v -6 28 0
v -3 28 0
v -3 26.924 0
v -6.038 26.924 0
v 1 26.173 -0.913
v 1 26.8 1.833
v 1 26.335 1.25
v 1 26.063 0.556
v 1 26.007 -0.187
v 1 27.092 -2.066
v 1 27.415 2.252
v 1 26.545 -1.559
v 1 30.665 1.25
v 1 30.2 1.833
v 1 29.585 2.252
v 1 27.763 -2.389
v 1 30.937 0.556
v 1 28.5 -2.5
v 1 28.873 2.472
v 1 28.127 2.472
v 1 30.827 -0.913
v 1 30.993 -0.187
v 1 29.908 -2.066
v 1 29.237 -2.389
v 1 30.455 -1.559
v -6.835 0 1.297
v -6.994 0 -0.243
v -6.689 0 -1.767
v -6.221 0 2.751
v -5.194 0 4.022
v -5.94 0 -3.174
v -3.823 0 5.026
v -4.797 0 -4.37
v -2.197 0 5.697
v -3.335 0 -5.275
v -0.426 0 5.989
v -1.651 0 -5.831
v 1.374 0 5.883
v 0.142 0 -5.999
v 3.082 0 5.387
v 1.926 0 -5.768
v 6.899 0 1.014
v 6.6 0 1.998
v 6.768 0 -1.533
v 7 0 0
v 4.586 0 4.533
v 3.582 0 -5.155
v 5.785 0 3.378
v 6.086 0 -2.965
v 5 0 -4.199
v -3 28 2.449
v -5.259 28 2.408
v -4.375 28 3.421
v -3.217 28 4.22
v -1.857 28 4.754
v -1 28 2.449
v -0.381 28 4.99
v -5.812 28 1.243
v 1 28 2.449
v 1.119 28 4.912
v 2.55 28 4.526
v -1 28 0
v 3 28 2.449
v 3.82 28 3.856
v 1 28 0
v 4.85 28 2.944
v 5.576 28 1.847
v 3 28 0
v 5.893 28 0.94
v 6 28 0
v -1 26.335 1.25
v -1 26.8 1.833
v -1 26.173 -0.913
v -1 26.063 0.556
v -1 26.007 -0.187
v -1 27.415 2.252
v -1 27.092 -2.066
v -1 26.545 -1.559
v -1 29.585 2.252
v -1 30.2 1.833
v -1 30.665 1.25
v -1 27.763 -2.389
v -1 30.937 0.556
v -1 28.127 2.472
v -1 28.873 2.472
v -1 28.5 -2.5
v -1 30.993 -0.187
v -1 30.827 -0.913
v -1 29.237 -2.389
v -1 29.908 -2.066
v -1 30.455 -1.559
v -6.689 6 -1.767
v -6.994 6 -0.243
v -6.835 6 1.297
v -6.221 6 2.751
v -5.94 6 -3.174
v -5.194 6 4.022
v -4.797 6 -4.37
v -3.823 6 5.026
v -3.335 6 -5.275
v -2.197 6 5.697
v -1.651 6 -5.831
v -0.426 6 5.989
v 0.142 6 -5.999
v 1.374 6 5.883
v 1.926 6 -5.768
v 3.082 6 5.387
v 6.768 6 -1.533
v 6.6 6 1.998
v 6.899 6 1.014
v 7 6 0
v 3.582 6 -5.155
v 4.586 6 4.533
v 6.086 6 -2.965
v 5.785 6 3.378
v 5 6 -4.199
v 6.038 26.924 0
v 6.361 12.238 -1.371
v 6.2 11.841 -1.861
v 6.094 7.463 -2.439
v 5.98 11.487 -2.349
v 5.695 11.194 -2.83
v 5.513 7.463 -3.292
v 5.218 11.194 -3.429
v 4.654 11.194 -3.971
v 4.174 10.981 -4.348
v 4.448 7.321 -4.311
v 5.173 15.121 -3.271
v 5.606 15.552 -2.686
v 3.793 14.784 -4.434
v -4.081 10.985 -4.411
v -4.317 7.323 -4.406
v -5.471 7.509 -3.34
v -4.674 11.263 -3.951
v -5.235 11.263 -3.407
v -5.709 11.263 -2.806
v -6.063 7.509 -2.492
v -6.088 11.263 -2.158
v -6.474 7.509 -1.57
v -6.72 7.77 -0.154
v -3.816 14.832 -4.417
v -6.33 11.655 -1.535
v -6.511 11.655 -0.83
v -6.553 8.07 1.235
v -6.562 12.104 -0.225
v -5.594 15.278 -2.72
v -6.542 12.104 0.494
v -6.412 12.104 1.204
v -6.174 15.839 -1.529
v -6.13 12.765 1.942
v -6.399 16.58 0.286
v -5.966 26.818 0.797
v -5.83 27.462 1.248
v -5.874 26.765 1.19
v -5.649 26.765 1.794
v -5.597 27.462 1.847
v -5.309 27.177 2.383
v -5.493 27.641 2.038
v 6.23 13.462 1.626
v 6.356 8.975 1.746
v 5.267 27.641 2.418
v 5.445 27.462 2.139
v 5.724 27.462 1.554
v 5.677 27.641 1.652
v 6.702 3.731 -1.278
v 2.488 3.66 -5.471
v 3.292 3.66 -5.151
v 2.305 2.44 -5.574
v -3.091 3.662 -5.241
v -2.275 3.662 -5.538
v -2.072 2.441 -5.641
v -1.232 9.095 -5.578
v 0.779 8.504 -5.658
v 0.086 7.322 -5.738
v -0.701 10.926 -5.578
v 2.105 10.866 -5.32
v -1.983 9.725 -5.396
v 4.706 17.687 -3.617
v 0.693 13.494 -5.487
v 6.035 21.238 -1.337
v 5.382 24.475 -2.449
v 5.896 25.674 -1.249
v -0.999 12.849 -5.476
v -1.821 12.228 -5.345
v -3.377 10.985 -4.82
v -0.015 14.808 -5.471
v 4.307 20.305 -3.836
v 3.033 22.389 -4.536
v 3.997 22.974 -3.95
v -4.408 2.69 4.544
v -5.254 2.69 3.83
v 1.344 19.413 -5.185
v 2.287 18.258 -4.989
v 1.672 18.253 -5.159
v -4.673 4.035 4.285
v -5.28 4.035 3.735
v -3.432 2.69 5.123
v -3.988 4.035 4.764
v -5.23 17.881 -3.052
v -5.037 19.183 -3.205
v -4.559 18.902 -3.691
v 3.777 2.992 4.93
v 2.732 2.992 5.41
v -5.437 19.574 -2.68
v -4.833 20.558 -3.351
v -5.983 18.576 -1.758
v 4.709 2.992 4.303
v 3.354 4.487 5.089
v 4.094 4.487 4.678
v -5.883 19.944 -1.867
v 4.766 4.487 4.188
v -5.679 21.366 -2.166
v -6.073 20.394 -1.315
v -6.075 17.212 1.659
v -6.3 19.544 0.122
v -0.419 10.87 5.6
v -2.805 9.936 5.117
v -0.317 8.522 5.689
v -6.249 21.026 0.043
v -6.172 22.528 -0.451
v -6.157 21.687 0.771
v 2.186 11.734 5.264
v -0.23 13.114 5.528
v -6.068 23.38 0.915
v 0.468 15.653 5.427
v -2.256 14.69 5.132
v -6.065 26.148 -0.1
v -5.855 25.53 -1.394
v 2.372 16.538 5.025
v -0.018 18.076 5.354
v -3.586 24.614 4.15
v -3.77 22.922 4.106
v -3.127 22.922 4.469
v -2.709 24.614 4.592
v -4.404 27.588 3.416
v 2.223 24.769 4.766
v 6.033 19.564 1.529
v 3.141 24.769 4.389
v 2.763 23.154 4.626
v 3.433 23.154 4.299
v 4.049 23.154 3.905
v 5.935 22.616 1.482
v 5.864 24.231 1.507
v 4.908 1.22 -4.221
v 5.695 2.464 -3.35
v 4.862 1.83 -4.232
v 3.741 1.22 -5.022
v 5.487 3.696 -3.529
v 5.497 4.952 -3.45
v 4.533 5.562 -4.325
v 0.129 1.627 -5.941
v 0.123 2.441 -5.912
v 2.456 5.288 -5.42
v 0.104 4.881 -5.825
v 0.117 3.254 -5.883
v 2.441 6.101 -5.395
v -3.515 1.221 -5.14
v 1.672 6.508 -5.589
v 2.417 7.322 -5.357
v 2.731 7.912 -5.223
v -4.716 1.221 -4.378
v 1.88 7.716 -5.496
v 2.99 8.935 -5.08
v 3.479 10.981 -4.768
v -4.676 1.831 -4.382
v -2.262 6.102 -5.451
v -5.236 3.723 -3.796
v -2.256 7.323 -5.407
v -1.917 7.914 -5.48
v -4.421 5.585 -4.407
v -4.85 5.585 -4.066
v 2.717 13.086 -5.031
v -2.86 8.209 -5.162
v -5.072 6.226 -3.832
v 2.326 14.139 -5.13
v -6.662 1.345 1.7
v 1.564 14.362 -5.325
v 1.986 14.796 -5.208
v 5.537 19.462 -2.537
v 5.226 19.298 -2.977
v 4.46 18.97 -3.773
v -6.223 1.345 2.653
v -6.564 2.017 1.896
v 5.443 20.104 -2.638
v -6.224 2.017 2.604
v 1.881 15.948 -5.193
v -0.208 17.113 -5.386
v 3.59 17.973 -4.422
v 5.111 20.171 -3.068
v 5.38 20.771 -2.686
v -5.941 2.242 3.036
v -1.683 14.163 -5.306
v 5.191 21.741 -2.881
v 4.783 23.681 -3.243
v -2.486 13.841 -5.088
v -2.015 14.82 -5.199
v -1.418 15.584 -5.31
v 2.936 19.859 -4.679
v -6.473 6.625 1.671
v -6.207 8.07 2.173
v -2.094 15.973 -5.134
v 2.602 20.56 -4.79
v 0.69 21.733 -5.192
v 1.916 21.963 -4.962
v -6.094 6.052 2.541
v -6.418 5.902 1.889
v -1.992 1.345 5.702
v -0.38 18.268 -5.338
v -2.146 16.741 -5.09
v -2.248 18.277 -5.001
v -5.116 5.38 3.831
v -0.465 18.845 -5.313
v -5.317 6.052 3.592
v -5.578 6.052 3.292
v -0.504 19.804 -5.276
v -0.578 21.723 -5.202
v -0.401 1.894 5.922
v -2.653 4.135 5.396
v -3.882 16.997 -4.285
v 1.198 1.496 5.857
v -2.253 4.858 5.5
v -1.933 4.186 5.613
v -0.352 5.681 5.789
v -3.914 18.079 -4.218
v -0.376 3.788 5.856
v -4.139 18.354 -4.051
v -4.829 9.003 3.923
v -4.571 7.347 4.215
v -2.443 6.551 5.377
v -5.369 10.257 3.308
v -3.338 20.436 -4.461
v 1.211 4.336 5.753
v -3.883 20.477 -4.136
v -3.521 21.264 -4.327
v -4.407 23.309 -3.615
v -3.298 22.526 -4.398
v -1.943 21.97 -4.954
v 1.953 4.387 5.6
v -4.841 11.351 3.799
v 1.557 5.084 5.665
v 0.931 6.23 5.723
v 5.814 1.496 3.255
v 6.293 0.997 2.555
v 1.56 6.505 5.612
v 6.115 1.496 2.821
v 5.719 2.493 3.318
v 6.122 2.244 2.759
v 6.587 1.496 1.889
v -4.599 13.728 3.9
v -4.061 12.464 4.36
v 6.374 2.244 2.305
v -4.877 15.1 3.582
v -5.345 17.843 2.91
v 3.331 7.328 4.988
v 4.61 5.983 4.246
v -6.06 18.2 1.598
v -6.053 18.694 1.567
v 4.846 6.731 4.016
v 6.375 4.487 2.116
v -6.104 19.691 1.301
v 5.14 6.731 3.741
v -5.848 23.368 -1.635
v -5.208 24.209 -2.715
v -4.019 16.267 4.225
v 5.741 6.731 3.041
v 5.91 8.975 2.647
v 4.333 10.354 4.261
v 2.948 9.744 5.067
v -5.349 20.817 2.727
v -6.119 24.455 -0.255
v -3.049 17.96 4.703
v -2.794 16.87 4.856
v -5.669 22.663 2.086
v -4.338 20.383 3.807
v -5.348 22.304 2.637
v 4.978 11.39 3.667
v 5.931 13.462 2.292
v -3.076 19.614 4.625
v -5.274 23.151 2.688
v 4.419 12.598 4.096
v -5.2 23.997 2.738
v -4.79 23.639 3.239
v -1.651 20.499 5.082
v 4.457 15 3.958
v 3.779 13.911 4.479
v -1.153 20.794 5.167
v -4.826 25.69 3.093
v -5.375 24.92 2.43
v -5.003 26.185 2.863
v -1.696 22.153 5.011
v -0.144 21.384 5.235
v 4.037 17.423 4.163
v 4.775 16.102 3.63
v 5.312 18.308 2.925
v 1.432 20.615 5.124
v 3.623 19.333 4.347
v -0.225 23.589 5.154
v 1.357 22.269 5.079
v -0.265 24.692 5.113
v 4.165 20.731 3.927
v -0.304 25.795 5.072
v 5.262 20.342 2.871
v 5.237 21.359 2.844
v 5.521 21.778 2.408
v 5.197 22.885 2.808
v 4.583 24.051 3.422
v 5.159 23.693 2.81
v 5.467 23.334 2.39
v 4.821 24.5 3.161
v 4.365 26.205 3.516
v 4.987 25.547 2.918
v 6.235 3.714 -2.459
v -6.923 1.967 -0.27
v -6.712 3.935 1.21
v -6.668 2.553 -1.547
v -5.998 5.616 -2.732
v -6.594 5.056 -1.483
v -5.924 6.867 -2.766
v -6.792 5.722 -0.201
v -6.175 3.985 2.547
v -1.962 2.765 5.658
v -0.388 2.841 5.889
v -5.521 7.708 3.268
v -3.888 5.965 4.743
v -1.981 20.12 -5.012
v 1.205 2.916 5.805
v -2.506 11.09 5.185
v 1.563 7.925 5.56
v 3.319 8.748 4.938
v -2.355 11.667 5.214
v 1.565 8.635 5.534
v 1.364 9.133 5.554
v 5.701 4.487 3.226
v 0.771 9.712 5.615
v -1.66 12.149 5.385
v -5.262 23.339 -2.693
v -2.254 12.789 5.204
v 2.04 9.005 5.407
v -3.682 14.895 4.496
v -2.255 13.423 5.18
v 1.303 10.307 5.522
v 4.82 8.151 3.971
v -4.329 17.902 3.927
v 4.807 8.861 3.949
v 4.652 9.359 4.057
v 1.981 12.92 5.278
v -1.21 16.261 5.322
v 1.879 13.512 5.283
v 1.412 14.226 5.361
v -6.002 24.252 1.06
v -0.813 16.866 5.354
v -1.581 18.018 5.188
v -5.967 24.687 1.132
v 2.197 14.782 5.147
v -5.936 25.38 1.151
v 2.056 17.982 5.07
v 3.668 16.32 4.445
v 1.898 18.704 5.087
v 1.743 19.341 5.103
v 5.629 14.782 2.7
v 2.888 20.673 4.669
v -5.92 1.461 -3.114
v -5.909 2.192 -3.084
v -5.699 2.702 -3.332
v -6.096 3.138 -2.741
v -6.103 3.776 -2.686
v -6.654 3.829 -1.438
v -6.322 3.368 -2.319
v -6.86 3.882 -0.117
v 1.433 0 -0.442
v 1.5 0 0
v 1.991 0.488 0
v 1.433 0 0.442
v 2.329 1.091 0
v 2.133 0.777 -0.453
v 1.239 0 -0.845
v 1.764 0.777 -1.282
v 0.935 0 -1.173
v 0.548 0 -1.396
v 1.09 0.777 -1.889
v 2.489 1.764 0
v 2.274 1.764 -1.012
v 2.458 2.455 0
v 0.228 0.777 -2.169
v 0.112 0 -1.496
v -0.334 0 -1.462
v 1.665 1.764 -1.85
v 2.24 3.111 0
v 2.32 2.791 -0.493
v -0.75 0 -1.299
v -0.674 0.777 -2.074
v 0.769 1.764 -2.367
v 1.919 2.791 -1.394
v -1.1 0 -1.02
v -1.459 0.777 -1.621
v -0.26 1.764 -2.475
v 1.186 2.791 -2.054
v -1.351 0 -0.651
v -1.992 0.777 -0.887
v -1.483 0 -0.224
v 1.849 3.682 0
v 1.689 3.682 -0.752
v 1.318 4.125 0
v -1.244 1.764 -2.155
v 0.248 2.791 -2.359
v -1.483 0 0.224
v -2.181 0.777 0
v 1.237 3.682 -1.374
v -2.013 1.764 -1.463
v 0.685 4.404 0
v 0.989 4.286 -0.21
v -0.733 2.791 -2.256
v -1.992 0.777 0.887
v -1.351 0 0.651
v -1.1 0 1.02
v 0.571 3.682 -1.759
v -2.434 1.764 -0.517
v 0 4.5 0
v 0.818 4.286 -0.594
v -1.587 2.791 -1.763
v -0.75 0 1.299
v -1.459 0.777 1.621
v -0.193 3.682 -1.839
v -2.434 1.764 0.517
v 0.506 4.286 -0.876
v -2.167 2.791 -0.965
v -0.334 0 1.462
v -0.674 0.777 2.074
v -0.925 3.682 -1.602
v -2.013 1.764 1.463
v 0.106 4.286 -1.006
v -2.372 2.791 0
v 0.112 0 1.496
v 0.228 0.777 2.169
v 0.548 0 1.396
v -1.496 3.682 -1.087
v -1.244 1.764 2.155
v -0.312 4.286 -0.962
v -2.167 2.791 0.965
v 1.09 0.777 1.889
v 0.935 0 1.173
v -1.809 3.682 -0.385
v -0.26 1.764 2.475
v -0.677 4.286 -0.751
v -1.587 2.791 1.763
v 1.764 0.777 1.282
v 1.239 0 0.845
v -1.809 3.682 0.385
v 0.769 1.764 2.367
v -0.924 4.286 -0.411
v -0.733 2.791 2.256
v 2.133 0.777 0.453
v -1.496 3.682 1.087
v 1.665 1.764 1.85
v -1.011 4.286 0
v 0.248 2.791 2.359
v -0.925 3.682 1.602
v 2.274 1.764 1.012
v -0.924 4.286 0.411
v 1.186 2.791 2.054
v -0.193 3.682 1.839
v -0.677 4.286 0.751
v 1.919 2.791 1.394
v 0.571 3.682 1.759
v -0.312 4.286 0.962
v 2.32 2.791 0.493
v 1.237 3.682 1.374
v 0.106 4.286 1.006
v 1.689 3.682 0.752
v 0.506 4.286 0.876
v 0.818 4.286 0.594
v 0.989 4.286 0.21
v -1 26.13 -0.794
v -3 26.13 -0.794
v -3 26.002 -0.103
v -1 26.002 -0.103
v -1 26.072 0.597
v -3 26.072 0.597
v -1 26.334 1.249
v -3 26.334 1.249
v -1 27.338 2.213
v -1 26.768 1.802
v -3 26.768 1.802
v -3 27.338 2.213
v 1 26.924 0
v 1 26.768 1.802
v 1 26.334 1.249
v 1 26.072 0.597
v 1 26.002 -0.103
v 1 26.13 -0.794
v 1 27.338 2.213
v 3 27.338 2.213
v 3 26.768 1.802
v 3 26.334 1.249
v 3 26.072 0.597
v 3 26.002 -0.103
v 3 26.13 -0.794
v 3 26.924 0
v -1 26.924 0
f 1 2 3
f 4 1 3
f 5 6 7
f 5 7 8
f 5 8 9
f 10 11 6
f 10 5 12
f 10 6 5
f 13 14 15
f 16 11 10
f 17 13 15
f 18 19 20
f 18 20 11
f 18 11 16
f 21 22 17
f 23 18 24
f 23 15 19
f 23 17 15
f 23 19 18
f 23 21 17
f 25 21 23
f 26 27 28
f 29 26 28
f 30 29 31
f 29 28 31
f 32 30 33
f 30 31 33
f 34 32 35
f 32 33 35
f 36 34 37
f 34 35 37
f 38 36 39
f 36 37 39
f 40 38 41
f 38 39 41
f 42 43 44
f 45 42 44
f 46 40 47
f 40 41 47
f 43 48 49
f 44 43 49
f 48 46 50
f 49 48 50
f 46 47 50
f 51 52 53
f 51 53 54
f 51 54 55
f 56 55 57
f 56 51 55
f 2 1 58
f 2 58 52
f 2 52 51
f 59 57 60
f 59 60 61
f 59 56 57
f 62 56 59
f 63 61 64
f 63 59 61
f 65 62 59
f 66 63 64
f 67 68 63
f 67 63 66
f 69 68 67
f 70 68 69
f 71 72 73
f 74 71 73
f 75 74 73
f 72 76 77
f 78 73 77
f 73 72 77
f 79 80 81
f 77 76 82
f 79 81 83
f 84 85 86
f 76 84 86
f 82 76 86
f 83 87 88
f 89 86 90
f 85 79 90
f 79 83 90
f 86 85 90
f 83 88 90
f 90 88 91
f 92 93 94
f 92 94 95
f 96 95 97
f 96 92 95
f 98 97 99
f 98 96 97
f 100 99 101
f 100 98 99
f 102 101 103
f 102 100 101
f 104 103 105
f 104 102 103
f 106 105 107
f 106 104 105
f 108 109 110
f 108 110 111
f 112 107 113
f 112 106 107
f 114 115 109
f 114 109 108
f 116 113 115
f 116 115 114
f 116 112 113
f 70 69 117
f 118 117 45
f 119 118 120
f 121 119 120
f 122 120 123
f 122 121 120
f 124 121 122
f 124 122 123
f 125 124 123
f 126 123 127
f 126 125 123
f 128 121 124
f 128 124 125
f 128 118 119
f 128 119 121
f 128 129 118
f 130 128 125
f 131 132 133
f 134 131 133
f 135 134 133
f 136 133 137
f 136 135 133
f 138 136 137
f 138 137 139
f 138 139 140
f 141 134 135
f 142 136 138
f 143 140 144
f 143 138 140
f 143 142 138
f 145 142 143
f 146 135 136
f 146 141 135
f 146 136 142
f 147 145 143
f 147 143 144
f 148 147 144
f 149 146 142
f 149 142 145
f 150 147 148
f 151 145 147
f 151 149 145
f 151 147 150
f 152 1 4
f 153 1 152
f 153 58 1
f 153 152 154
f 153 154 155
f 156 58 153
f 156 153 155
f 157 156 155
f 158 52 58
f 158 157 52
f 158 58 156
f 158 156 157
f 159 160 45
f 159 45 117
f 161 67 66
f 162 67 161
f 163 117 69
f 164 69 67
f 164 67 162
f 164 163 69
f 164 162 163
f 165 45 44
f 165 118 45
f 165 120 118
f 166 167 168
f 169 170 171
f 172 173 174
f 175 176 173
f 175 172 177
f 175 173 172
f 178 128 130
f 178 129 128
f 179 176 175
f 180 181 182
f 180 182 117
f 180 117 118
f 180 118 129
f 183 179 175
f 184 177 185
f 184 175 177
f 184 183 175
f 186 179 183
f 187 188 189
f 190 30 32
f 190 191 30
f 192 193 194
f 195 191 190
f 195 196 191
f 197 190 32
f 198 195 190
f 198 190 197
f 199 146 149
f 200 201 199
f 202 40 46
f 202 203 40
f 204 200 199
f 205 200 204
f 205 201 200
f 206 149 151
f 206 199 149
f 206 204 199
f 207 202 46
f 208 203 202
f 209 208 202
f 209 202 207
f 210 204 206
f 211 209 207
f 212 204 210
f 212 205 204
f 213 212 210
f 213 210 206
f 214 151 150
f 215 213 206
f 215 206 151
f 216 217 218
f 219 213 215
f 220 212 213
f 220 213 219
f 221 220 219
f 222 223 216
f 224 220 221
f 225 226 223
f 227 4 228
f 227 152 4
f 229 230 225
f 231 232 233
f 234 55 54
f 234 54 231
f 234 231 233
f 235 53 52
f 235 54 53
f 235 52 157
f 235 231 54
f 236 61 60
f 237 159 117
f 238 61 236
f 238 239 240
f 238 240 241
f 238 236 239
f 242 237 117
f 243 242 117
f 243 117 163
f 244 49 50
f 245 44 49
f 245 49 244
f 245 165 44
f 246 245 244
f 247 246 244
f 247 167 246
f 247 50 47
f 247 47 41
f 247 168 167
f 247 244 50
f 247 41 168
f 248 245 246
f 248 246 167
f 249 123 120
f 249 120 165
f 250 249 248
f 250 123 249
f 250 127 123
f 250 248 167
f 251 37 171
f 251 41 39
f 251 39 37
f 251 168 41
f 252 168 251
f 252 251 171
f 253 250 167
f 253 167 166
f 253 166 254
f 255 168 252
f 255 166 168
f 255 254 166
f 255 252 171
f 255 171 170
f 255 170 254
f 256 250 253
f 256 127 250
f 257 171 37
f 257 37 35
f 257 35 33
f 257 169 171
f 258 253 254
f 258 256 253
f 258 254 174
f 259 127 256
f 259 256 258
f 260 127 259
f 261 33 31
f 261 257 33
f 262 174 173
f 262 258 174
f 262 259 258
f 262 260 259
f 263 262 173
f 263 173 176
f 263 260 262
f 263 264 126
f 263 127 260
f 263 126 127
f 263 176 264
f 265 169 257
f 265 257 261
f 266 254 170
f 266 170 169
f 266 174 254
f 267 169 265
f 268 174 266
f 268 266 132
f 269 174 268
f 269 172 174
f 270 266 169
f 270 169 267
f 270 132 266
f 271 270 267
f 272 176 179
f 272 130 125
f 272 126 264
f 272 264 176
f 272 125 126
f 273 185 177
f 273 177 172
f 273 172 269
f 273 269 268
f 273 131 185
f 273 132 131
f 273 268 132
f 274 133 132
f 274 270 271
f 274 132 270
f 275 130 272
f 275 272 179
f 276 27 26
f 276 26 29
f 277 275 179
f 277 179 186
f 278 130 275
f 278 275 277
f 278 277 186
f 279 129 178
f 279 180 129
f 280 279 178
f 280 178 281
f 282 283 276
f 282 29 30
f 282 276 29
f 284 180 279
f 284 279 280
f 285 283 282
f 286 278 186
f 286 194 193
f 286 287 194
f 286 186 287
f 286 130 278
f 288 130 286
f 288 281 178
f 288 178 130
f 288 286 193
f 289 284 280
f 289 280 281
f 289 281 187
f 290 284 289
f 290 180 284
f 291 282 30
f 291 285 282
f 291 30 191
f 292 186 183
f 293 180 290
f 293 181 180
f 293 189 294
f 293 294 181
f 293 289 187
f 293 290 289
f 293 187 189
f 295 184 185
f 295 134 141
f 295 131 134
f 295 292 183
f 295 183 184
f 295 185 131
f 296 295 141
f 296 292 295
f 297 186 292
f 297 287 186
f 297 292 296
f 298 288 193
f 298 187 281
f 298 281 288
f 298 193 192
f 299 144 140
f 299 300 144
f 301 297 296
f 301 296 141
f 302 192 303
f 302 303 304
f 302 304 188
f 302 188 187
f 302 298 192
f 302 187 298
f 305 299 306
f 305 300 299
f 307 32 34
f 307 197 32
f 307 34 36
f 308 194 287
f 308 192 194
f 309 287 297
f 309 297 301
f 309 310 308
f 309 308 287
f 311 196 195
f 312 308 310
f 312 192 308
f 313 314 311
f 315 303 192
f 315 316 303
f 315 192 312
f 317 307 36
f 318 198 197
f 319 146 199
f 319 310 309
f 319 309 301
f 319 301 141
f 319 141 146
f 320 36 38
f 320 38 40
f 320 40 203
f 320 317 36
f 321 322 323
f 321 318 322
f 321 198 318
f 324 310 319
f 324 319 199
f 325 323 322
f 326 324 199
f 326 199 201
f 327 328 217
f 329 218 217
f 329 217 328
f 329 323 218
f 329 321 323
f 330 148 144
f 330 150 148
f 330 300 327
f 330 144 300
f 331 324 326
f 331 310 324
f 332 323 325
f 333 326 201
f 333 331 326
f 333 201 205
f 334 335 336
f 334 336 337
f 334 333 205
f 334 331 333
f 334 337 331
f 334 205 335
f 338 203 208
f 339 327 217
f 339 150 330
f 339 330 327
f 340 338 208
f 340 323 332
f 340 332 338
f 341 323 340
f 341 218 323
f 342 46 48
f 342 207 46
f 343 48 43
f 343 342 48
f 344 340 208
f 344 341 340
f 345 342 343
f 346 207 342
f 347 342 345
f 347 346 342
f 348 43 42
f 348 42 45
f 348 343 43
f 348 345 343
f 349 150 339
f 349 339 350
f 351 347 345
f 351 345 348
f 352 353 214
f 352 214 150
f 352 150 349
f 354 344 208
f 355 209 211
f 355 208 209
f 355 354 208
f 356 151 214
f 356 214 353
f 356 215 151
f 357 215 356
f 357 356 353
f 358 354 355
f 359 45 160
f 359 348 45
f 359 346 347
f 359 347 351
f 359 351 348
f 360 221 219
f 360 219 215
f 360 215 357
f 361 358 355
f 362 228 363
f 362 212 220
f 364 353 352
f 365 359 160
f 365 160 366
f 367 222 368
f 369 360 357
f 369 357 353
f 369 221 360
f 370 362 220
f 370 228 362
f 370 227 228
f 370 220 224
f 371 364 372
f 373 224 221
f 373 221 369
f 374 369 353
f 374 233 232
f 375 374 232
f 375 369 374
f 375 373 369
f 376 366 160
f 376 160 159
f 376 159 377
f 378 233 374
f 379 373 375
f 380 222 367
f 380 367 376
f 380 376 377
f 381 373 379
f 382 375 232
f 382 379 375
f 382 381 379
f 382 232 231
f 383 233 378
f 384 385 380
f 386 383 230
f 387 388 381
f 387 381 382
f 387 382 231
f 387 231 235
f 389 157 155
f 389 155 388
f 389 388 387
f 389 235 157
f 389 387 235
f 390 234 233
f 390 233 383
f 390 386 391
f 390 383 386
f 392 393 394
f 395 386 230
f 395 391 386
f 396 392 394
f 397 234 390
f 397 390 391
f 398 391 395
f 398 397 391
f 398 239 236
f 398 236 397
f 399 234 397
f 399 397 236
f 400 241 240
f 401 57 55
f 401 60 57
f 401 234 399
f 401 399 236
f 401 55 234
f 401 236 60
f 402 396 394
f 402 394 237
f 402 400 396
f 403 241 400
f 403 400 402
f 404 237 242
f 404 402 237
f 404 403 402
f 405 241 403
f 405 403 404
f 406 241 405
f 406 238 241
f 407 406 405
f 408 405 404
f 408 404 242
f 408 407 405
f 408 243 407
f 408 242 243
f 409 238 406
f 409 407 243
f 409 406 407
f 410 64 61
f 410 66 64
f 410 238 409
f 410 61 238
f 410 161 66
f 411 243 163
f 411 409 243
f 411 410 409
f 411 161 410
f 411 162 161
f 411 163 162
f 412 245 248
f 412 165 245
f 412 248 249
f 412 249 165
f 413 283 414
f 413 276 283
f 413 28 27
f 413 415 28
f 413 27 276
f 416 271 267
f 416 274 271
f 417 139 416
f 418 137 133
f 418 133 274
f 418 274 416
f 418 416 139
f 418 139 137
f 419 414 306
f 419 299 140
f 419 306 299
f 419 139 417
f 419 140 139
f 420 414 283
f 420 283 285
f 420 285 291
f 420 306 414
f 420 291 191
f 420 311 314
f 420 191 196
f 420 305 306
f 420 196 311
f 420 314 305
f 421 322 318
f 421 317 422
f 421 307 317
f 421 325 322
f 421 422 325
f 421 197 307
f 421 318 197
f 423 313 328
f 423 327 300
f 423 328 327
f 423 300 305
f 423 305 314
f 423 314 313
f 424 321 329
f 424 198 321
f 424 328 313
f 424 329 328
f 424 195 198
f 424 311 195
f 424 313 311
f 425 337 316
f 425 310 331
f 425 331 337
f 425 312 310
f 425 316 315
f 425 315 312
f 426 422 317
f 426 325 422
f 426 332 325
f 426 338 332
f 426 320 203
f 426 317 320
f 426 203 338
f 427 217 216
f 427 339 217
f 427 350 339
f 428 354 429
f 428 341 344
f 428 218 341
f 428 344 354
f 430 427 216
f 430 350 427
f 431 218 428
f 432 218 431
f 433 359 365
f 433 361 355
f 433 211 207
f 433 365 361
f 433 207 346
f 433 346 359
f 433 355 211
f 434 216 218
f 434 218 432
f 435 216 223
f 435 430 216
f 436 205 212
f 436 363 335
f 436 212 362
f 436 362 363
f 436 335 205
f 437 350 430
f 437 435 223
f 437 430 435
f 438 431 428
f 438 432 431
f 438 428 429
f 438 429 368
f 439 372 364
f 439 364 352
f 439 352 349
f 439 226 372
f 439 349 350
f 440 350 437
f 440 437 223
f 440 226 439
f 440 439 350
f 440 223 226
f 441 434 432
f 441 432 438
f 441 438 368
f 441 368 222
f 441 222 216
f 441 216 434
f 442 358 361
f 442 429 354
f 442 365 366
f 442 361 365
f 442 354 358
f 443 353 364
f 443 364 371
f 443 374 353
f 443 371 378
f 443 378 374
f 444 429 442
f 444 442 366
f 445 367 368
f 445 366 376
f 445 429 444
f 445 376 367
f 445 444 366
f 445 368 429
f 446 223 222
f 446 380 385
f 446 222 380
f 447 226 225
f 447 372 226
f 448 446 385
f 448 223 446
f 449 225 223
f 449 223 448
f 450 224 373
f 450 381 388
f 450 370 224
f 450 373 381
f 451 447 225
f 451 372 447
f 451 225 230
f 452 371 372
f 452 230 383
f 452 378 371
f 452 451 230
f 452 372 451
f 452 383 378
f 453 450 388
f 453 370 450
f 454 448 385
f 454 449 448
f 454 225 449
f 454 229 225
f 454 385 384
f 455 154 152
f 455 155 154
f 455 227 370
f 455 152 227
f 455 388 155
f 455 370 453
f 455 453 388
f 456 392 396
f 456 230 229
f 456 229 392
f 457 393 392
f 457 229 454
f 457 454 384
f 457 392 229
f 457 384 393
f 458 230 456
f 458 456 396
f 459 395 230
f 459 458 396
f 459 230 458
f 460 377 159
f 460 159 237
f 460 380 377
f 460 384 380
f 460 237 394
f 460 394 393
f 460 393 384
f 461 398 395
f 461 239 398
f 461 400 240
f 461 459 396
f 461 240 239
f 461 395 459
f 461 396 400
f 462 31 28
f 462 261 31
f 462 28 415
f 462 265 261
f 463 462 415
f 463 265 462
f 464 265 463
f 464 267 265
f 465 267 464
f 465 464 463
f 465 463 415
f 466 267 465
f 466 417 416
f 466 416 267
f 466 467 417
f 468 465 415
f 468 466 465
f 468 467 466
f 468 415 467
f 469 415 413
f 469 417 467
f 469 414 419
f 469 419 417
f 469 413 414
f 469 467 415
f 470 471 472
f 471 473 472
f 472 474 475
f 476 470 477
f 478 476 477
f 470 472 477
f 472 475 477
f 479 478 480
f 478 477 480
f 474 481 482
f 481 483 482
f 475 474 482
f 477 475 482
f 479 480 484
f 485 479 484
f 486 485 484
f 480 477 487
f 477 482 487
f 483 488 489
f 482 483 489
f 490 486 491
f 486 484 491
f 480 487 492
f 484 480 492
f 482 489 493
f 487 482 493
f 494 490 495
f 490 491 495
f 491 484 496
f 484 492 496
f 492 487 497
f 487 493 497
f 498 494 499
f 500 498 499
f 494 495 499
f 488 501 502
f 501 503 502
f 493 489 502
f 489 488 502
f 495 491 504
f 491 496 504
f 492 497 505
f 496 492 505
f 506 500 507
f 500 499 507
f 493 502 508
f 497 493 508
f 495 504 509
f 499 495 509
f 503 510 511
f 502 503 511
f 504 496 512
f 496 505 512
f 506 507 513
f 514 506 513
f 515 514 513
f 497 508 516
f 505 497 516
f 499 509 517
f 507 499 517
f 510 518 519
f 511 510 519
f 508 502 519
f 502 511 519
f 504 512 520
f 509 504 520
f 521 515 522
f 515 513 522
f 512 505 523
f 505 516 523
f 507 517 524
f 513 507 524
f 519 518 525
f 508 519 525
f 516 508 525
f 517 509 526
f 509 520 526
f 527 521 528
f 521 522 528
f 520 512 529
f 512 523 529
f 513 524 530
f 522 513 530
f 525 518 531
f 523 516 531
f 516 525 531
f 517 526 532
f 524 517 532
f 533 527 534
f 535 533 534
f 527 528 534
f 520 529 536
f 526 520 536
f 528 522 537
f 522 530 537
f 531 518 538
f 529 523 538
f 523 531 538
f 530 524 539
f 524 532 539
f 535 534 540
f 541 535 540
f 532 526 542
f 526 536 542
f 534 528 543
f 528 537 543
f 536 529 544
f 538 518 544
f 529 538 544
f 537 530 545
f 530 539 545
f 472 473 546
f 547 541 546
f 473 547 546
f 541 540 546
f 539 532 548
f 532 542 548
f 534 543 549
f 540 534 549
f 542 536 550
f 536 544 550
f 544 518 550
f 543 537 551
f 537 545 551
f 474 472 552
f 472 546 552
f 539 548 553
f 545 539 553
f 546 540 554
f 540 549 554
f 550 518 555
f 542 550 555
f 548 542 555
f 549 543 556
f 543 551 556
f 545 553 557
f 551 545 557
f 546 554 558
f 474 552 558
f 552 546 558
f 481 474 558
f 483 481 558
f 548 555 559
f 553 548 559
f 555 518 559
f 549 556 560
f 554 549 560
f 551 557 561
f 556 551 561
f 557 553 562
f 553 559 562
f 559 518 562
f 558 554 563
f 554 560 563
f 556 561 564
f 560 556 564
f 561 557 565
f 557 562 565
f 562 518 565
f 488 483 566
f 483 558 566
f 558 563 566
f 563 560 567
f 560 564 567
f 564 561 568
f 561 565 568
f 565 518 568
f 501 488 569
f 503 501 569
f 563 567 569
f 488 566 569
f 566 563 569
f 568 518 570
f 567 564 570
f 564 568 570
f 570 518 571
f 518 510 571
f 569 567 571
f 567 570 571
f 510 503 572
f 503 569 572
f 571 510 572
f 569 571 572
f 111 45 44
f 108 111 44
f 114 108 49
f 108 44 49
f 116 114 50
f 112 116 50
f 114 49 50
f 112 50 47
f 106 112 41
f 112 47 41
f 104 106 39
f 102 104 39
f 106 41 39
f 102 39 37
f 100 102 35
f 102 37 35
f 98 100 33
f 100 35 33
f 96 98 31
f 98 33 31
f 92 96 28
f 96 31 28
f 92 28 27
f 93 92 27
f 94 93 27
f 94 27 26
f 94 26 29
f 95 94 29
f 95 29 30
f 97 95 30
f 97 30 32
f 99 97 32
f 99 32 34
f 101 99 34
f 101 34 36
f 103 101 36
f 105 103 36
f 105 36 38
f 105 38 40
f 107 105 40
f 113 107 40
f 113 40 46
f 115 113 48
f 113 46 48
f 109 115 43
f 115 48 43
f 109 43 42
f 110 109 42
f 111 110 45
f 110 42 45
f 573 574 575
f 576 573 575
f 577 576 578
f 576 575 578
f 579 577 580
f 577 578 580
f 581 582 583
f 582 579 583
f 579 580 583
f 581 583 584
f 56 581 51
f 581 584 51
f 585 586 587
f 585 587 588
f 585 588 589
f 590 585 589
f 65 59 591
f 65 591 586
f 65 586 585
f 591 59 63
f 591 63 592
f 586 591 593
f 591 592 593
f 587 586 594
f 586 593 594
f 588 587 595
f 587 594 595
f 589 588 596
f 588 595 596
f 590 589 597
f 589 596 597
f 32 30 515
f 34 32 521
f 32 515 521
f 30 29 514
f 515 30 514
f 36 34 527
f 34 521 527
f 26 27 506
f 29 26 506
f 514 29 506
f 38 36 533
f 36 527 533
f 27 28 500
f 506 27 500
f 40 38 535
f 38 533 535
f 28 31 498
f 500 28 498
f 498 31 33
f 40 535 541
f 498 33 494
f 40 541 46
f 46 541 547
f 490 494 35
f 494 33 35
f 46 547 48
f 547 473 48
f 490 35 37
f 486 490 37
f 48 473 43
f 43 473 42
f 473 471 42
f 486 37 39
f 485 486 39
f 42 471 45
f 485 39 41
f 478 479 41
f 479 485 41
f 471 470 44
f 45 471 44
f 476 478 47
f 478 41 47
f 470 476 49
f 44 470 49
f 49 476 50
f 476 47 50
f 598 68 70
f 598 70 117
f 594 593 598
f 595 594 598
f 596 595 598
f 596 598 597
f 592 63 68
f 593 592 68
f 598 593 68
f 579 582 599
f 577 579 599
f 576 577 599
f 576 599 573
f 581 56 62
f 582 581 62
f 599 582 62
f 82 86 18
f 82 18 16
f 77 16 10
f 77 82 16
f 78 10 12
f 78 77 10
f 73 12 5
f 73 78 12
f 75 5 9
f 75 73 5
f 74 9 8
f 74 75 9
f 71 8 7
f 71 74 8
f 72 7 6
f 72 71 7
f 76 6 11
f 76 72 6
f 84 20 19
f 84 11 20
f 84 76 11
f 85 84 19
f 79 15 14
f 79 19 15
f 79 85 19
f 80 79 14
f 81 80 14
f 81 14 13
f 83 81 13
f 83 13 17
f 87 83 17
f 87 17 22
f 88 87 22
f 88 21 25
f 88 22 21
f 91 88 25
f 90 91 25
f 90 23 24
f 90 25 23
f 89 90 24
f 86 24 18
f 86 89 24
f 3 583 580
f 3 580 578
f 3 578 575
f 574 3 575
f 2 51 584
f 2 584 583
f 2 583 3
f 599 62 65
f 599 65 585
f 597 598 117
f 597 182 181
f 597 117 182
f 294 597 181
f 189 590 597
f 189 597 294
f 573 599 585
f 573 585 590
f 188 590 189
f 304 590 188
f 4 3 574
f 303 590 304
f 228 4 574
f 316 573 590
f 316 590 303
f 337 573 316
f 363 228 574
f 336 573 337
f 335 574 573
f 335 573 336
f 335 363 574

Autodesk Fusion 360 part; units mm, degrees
sketch "Sketch1" plane through (0, 0, 0) normal (0, 1, 0) x (1, 0, 0)
  circle A0 centre (0, 0) radius 1
  dimension "d1" = 2
extrude "Extrude1" add sketch "Sketch1" along normal blind 6

Autodesk Fusion 360 part; units mm, degrees
sketch "Sketch1" plane through (0, 0, 0) normal (0, 1, 0) x (1, 0, 0)
  circle A0 centre (0, 0) radius 1
  dimension "d1" = 2
extrude "Extrude1" add sketch "Sketch1" along normal blind 5 makes body 1
sketch "Sketch2" plane through (0, 0, 0) normal (0, 1, 0) x (1, 0, 0)
  circle A0 centre (0, 0) radius 2.5
  dimension "d4" = 5
sphere "SpherePrimitive1" cut diameter 5.4 placed x (1, 0, 0) y (0, 0, -1) z (0, 1, 0) at (0, 0, 0) bodies 1
sphere "SpherePrimitive2" add diameter 5 placed x (1, 0, 0) y (0, 0, -1) z (0, 1, 0) at (0, 0, 0) separate body makes body 2
extrude "Extrude2" add 1 faces at (-0.3296, 5, -0.5031) along direction (0, -1, 0) blind 3 on bodies 1 bodies 1 2
extrude "Extrude3" add 1 faces at (-0.3296, 5, -0.5031) along direction (0, 1, 0) blind 1 on bodies 1 bodies 1

Autodesk Fusion 360 part; units mm, degrees
sketch "Sketch1" plane through (0, 0, 0) normal (0, 1, 0) x (1, 0, 0)
  ellipse E0 centre (0, 0) end of major axis (7, 0) minor radius 6
  line L0 (-7, 0) -> (7, 0) construction
  line L1 (0, -6) -> (0, 6) construction
  dimension "d2" = 12
ref_plane "WorkPlane1" through (0, 28, 0) normal (0, 1, 0) x (1, 0, 0)
sketch "Sketch2" plane through (0, 28, 0) normal (0, 1, 0) x (1, 0, 0)
  ellipse E0 centre (0, 0) end of major axis (6, 0) minor radius 5
  line L0 (-6, 0) -> (6, 0) construction
  line L1 (0, -5) -> (0, 5) construction
  dimension "d3" = 10
sketch "Sketch3" plane through (0, 28, 0) normal (0, 1, 0) x (1, 0, 0)
loft "Loft1" add profiles "Sketch1", "Sketch2" section 1 section 2 makes body 1
sketch "Sketch4" plane through (0, 0, 0) normal (1, 0, 0) x (0, 0, -1)
  line L0 (0, 0) -> (0, 1)
  line L1 (0, 1) -> (7, 8)
  line L2 (7, 8) -> (7, 0)
  line L3 (7, 0) -> (0, 0)
  line L4 (0, 28) -> (0, 26.9237)
  line L5 (0, 26.9237) -> (5.6513, 21.2732)
  line L6 (5.6513, 21.2732) -> (5.6513, 28)
  line L7 (5.6513, 28) -> (0, 28)
  line L8 (0, 28) -> (0, 26.9237)
  line L9 (0, 28) -> (0, 26.9237)
  line L10 (0, 26.9237) -> (5.6513, 21.2732)
  line L11 (5.6513, 28) -> (0, 28)
  point P0 (0, 28)
extrude "Extrude1" cut sketch "Sketch4" along normal through all and the other way through all contours L4 L5 L6 L7 L8 L9 L10 L11 bodies 1
sketch "Sketch5" plane through (0, 0, 0) normal (1, 0, 0) x (0, 0, -1)
  circle A0 centre (0, -0.5) radius 2.5
  circle A1 centre (0, 28.5) radius 2.5
  dimension "d5" = 5
  dimension "d6" = 5
extrude "Extrude2" add sketch "Sketch5" along normal mid plane 6 separate body contours A1 makes body 2
extrude "Extrude3" cut 1 faces at (-3, 28.6214, -0.8056) along direction (1, 0, 0) blind 2 on bodies 2 bodies 1 2
extrude "Extrude4" cut 1 faces at (3, 28.6214, -0.8056) along direction (-1, 0, 0) blind 2 on bodies 2 bodies 1 2
sketch "Sketch6" plane through (0, 0, 0) normal (1, 0, 0) x (0, 0, -1)
  circle A0 centre (0, 28.5) radius 1
  dimension "d16" = 2
ref_plane "WorkPlane2" through (0, 2, 0) normal (0, 1, 0) x (0, 0, 1)
sketch "Sketch7" plane through (0, 2, 0) normal (0, 1, 0) x (1, 0, 0)
  circle A0 centre (0, 0) radius 2.5
  dimension "d19" = 5
sphere "SpherePrimitive1" cut diameter 5 placed x (1, 0, 0) y (0, 0, -1) z (0, 1, 0) at (0, 2, 0) bodies 1
